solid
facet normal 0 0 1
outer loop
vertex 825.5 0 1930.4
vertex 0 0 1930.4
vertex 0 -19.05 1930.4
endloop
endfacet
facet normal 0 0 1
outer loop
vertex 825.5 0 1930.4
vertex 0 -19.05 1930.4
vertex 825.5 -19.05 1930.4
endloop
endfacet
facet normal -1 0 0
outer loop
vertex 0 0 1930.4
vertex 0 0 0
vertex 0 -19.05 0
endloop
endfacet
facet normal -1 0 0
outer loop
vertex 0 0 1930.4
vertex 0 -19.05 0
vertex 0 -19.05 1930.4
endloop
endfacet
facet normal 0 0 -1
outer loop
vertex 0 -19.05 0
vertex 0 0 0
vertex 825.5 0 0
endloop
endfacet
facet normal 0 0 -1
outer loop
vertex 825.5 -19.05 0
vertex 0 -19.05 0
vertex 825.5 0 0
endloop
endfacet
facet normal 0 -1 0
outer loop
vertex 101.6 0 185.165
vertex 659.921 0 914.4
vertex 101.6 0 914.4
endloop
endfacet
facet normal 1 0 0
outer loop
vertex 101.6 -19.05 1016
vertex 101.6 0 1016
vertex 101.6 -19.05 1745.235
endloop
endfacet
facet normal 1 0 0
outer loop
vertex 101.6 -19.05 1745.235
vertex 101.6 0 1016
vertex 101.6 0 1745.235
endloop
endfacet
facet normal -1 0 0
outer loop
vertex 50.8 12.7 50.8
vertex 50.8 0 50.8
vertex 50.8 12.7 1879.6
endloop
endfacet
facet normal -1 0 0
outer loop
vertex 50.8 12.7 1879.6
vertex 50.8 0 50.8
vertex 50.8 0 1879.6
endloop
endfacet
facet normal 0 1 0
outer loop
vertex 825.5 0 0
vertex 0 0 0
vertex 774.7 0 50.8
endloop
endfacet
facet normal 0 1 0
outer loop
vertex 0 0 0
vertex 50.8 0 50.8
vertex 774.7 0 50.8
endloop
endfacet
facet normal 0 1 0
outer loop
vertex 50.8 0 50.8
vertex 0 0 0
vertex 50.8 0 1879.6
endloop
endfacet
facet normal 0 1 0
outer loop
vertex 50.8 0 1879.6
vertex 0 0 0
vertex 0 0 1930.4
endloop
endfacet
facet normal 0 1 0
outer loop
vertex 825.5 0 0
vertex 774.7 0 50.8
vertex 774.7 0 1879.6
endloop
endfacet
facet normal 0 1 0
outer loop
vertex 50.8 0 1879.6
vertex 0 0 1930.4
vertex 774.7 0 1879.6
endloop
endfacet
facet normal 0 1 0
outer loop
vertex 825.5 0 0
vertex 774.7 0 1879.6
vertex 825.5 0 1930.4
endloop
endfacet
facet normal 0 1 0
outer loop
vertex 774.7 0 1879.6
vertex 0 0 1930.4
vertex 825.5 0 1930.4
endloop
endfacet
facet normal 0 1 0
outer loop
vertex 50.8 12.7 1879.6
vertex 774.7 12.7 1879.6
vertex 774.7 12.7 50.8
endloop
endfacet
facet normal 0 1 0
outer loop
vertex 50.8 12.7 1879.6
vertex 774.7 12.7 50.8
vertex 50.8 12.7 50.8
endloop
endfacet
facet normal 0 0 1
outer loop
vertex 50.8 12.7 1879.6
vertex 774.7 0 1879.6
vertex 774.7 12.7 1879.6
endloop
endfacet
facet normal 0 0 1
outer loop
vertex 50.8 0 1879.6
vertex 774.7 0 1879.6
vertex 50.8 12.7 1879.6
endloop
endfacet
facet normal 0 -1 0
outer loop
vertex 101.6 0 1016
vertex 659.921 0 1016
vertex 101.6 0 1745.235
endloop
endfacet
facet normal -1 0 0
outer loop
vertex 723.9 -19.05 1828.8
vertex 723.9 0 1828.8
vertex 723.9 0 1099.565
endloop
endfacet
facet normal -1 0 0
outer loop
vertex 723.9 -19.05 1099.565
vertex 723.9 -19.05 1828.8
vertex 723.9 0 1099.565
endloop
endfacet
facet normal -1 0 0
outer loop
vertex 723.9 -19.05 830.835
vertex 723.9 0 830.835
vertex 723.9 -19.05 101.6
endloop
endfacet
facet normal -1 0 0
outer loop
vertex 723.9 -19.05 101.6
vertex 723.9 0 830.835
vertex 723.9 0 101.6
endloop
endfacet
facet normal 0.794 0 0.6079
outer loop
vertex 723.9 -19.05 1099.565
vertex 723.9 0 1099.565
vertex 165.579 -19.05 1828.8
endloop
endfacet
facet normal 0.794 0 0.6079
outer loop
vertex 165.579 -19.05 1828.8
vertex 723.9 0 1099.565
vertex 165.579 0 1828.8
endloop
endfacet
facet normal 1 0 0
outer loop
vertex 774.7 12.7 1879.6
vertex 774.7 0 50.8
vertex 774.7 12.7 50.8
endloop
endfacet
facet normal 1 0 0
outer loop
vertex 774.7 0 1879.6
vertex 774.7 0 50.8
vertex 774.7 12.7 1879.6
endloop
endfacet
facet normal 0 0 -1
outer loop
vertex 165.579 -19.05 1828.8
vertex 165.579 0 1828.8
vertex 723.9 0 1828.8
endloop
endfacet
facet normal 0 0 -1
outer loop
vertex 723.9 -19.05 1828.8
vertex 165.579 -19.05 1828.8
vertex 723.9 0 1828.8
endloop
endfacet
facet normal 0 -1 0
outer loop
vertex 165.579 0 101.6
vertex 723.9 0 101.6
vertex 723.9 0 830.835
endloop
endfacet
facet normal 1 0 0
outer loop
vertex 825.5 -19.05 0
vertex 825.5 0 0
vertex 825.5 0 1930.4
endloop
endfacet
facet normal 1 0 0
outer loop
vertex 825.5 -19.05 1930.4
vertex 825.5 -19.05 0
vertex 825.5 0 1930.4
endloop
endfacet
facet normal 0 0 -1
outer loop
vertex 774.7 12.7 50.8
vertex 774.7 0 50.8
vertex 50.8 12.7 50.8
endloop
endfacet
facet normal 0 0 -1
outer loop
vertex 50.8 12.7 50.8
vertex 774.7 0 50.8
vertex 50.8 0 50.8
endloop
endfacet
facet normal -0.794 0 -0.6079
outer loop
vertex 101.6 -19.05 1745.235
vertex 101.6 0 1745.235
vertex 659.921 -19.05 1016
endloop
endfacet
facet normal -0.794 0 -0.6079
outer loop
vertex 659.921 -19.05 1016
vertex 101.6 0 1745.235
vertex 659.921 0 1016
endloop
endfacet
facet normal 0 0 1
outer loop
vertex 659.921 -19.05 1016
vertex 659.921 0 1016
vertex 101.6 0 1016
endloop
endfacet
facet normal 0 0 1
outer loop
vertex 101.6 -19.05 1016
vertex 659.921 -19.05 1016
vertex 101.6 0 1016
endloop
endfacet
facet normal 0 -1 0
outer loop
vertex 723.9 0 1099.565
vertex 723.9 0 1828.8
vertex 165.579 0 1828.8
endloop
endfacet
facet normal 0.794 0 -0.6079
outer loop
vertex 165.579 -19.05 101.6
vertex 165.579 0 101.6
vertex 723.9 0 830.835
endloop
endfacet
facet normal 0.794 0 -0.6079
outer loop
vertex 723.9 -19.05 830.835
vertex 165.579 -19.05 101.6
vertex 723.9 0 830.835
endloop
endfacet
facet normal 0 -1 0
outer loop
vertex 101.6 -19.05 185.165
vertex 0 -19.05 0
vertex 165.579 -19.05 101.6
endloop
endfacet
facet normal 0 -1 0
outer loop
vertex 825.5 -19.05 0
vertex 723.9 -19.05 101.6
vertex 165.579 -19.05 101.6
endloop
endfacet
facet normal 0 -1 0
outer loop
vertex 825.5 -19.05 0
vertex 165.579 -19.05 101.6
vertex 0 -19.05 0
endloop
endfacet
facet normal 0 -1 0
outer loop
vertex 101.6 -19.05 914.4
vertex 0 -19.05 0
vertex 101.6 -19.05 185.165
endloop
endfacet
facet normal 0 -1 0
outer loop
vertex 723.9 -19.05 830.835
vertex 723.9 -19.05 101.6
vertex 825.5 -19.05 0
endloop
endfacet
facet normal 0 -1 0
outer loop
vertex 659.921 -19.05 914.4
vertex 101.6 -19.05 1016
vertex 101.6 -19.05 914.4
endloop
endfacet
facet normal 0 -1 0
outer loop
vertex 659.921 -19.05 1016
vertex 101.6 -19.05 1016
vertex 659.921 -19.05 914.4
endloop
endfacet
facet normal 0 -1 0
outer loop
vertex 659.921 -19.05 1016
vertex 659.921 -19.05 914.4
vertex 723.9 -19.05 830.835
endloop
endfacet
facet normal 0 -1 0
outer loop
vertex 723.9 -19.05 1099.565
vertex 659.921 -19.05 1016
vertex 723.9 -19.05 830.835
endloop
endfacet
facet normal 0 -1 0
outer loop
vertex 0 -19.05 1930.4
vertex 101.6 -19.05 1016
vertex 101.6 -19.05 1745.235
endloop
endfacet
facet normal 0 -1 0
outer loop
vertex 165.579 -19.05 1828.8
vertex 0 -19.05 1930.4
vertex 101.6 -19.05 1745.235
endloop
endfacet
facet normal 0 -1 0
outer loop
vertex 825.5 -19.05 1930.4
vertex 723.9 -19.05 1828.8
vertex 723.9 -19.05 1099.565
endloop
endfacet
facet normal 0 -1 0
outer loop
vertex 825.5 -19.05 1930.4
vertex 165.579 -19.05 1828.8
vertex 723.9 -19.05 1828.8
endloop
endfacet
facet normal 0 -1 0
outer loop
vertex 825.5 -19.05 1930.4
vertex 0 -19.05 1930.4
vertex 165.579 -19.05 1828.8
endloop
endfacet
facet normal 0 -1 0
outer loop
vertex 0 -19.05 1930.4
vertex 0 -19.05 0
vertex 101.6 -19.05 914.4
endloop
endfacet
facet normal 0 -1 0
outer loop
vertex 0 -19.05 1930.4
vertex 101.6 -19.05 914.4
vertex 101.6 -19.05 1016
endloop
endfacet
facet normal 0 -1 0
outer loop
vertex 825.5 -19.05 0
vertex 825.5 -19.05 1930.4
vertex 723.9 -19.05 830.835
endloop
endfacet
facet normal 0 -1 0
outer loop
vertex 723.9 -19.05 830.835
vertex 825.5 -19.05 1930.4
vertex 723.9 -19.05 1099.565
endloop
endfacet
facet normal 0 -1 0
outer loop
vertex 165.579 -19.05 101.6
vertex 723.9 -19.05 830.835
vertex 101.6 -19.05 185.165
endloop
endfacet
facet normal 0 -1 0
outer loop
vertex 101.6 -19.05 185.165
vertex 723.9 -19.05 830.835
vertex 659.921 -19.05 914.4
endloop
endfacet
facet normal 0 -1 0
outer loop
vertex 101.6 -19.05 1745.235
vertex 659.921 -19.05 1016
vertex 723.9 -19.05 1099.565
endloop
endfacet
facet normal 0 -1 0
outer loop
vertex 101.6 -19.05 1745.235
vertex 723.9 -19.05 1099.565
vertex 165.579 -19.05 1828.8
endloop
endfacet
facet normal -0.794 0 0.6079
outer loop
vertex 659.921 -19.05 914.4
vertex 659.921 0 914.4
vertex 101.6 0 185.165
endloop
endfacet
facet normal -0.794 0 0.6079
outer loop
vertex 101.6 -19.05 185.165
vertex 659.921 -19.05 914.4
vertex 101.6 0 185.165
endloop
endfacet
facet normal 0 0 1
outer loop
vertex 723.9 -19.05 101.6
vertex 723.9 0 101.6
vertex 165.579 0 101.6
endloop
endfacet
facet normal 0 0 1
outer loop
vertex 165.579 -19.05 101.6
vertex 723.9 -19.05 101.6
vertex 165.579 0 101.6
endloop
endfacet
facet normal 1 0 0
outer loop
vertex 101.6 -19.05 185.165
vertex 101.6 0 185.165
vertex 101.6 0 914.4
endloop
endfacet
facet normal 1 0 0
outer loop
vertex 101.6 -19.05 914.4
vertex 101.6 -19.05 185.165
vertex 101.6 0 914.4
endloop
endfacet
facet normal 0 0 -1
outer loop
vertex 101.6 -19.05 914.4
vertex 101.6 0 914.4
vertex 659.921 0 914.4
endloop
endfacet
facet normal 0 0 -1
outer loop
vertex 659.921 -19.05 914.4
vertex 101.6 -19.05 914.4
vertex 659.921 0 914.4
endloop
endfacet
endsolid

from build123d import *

# Parameters (mm, degrees)
F0_W     = 825.5
F0_H     = 1930.4
F1_DEPTH = 19.05
F2_W     = 723.9
F2_H     = 1828.8
F3_DEPTH = 12.7


with BuildPart() as f1:
    # F0 (on Front) → F1 (new body)
    with BuildSketch(Plane.XZ):
        with Locations((412.75, 965.2)):
            Rectangle(F0_W, F0_H)
        Polygon((101.6, 185.164932), (101.6, 914.4), (101.6, 965.2), (101.6, 1016), (101.6, 1745.235068), (101.6, 1828.8), (165.579401, 1828.8), (723.9, 1828.8), (723.9, 1099.564932), (723.9, 1016), (723.9, 965.2), (723.9, 914.4), (723.9, 830.835068), (723.9, 101.6), (165.579401, 101.6), (101.6, 101.6), align=None, mode=Mode.SUBTRACT)
        Polygon((101.6, 1828.8), (101.6, 1745.235068), (659.920599, 1016), (723.9, 1016), align=None)
        Polygon((101.6, 1828.8), (723.9, 1016), (723.9, 1099.564932), (165.579401, 1828.8), align=None)
        Polygon((101.6, 1016), (101.6, 965.2), (723.9, 965.2), (723.9, 1016), (659.920599, 1016), align=None)
        Polygon((101.6, 965.2), (101.6, 914.4), (659.920599, 914.4), (723.9, 914.4), (723.9, 965.2), align=None)
        Polygon((659.920599, 914.4), (101.6, 185.164932), (101.6, 101.6), (723.9, 914.4), align=None)
        Polygon((723.9, 914.4), (101.6, 101.6), (165.579401, 101.6), (723.9, 830.835068), align=None)
    extrude(amount=F1_DEPTH)

    # F2 (on face) → F3 (join)
    with BuildSketch(Plane(origin=(0, 0, 0), x_dir=(-1, 0, 0), z_dir=(0, 1, 0))):
        with Locations((-412.75, 965.2)):
            Rectangle(F2_W, F2_H)
    extrude(amount=F3_DEPTH)


solid = f1.part
